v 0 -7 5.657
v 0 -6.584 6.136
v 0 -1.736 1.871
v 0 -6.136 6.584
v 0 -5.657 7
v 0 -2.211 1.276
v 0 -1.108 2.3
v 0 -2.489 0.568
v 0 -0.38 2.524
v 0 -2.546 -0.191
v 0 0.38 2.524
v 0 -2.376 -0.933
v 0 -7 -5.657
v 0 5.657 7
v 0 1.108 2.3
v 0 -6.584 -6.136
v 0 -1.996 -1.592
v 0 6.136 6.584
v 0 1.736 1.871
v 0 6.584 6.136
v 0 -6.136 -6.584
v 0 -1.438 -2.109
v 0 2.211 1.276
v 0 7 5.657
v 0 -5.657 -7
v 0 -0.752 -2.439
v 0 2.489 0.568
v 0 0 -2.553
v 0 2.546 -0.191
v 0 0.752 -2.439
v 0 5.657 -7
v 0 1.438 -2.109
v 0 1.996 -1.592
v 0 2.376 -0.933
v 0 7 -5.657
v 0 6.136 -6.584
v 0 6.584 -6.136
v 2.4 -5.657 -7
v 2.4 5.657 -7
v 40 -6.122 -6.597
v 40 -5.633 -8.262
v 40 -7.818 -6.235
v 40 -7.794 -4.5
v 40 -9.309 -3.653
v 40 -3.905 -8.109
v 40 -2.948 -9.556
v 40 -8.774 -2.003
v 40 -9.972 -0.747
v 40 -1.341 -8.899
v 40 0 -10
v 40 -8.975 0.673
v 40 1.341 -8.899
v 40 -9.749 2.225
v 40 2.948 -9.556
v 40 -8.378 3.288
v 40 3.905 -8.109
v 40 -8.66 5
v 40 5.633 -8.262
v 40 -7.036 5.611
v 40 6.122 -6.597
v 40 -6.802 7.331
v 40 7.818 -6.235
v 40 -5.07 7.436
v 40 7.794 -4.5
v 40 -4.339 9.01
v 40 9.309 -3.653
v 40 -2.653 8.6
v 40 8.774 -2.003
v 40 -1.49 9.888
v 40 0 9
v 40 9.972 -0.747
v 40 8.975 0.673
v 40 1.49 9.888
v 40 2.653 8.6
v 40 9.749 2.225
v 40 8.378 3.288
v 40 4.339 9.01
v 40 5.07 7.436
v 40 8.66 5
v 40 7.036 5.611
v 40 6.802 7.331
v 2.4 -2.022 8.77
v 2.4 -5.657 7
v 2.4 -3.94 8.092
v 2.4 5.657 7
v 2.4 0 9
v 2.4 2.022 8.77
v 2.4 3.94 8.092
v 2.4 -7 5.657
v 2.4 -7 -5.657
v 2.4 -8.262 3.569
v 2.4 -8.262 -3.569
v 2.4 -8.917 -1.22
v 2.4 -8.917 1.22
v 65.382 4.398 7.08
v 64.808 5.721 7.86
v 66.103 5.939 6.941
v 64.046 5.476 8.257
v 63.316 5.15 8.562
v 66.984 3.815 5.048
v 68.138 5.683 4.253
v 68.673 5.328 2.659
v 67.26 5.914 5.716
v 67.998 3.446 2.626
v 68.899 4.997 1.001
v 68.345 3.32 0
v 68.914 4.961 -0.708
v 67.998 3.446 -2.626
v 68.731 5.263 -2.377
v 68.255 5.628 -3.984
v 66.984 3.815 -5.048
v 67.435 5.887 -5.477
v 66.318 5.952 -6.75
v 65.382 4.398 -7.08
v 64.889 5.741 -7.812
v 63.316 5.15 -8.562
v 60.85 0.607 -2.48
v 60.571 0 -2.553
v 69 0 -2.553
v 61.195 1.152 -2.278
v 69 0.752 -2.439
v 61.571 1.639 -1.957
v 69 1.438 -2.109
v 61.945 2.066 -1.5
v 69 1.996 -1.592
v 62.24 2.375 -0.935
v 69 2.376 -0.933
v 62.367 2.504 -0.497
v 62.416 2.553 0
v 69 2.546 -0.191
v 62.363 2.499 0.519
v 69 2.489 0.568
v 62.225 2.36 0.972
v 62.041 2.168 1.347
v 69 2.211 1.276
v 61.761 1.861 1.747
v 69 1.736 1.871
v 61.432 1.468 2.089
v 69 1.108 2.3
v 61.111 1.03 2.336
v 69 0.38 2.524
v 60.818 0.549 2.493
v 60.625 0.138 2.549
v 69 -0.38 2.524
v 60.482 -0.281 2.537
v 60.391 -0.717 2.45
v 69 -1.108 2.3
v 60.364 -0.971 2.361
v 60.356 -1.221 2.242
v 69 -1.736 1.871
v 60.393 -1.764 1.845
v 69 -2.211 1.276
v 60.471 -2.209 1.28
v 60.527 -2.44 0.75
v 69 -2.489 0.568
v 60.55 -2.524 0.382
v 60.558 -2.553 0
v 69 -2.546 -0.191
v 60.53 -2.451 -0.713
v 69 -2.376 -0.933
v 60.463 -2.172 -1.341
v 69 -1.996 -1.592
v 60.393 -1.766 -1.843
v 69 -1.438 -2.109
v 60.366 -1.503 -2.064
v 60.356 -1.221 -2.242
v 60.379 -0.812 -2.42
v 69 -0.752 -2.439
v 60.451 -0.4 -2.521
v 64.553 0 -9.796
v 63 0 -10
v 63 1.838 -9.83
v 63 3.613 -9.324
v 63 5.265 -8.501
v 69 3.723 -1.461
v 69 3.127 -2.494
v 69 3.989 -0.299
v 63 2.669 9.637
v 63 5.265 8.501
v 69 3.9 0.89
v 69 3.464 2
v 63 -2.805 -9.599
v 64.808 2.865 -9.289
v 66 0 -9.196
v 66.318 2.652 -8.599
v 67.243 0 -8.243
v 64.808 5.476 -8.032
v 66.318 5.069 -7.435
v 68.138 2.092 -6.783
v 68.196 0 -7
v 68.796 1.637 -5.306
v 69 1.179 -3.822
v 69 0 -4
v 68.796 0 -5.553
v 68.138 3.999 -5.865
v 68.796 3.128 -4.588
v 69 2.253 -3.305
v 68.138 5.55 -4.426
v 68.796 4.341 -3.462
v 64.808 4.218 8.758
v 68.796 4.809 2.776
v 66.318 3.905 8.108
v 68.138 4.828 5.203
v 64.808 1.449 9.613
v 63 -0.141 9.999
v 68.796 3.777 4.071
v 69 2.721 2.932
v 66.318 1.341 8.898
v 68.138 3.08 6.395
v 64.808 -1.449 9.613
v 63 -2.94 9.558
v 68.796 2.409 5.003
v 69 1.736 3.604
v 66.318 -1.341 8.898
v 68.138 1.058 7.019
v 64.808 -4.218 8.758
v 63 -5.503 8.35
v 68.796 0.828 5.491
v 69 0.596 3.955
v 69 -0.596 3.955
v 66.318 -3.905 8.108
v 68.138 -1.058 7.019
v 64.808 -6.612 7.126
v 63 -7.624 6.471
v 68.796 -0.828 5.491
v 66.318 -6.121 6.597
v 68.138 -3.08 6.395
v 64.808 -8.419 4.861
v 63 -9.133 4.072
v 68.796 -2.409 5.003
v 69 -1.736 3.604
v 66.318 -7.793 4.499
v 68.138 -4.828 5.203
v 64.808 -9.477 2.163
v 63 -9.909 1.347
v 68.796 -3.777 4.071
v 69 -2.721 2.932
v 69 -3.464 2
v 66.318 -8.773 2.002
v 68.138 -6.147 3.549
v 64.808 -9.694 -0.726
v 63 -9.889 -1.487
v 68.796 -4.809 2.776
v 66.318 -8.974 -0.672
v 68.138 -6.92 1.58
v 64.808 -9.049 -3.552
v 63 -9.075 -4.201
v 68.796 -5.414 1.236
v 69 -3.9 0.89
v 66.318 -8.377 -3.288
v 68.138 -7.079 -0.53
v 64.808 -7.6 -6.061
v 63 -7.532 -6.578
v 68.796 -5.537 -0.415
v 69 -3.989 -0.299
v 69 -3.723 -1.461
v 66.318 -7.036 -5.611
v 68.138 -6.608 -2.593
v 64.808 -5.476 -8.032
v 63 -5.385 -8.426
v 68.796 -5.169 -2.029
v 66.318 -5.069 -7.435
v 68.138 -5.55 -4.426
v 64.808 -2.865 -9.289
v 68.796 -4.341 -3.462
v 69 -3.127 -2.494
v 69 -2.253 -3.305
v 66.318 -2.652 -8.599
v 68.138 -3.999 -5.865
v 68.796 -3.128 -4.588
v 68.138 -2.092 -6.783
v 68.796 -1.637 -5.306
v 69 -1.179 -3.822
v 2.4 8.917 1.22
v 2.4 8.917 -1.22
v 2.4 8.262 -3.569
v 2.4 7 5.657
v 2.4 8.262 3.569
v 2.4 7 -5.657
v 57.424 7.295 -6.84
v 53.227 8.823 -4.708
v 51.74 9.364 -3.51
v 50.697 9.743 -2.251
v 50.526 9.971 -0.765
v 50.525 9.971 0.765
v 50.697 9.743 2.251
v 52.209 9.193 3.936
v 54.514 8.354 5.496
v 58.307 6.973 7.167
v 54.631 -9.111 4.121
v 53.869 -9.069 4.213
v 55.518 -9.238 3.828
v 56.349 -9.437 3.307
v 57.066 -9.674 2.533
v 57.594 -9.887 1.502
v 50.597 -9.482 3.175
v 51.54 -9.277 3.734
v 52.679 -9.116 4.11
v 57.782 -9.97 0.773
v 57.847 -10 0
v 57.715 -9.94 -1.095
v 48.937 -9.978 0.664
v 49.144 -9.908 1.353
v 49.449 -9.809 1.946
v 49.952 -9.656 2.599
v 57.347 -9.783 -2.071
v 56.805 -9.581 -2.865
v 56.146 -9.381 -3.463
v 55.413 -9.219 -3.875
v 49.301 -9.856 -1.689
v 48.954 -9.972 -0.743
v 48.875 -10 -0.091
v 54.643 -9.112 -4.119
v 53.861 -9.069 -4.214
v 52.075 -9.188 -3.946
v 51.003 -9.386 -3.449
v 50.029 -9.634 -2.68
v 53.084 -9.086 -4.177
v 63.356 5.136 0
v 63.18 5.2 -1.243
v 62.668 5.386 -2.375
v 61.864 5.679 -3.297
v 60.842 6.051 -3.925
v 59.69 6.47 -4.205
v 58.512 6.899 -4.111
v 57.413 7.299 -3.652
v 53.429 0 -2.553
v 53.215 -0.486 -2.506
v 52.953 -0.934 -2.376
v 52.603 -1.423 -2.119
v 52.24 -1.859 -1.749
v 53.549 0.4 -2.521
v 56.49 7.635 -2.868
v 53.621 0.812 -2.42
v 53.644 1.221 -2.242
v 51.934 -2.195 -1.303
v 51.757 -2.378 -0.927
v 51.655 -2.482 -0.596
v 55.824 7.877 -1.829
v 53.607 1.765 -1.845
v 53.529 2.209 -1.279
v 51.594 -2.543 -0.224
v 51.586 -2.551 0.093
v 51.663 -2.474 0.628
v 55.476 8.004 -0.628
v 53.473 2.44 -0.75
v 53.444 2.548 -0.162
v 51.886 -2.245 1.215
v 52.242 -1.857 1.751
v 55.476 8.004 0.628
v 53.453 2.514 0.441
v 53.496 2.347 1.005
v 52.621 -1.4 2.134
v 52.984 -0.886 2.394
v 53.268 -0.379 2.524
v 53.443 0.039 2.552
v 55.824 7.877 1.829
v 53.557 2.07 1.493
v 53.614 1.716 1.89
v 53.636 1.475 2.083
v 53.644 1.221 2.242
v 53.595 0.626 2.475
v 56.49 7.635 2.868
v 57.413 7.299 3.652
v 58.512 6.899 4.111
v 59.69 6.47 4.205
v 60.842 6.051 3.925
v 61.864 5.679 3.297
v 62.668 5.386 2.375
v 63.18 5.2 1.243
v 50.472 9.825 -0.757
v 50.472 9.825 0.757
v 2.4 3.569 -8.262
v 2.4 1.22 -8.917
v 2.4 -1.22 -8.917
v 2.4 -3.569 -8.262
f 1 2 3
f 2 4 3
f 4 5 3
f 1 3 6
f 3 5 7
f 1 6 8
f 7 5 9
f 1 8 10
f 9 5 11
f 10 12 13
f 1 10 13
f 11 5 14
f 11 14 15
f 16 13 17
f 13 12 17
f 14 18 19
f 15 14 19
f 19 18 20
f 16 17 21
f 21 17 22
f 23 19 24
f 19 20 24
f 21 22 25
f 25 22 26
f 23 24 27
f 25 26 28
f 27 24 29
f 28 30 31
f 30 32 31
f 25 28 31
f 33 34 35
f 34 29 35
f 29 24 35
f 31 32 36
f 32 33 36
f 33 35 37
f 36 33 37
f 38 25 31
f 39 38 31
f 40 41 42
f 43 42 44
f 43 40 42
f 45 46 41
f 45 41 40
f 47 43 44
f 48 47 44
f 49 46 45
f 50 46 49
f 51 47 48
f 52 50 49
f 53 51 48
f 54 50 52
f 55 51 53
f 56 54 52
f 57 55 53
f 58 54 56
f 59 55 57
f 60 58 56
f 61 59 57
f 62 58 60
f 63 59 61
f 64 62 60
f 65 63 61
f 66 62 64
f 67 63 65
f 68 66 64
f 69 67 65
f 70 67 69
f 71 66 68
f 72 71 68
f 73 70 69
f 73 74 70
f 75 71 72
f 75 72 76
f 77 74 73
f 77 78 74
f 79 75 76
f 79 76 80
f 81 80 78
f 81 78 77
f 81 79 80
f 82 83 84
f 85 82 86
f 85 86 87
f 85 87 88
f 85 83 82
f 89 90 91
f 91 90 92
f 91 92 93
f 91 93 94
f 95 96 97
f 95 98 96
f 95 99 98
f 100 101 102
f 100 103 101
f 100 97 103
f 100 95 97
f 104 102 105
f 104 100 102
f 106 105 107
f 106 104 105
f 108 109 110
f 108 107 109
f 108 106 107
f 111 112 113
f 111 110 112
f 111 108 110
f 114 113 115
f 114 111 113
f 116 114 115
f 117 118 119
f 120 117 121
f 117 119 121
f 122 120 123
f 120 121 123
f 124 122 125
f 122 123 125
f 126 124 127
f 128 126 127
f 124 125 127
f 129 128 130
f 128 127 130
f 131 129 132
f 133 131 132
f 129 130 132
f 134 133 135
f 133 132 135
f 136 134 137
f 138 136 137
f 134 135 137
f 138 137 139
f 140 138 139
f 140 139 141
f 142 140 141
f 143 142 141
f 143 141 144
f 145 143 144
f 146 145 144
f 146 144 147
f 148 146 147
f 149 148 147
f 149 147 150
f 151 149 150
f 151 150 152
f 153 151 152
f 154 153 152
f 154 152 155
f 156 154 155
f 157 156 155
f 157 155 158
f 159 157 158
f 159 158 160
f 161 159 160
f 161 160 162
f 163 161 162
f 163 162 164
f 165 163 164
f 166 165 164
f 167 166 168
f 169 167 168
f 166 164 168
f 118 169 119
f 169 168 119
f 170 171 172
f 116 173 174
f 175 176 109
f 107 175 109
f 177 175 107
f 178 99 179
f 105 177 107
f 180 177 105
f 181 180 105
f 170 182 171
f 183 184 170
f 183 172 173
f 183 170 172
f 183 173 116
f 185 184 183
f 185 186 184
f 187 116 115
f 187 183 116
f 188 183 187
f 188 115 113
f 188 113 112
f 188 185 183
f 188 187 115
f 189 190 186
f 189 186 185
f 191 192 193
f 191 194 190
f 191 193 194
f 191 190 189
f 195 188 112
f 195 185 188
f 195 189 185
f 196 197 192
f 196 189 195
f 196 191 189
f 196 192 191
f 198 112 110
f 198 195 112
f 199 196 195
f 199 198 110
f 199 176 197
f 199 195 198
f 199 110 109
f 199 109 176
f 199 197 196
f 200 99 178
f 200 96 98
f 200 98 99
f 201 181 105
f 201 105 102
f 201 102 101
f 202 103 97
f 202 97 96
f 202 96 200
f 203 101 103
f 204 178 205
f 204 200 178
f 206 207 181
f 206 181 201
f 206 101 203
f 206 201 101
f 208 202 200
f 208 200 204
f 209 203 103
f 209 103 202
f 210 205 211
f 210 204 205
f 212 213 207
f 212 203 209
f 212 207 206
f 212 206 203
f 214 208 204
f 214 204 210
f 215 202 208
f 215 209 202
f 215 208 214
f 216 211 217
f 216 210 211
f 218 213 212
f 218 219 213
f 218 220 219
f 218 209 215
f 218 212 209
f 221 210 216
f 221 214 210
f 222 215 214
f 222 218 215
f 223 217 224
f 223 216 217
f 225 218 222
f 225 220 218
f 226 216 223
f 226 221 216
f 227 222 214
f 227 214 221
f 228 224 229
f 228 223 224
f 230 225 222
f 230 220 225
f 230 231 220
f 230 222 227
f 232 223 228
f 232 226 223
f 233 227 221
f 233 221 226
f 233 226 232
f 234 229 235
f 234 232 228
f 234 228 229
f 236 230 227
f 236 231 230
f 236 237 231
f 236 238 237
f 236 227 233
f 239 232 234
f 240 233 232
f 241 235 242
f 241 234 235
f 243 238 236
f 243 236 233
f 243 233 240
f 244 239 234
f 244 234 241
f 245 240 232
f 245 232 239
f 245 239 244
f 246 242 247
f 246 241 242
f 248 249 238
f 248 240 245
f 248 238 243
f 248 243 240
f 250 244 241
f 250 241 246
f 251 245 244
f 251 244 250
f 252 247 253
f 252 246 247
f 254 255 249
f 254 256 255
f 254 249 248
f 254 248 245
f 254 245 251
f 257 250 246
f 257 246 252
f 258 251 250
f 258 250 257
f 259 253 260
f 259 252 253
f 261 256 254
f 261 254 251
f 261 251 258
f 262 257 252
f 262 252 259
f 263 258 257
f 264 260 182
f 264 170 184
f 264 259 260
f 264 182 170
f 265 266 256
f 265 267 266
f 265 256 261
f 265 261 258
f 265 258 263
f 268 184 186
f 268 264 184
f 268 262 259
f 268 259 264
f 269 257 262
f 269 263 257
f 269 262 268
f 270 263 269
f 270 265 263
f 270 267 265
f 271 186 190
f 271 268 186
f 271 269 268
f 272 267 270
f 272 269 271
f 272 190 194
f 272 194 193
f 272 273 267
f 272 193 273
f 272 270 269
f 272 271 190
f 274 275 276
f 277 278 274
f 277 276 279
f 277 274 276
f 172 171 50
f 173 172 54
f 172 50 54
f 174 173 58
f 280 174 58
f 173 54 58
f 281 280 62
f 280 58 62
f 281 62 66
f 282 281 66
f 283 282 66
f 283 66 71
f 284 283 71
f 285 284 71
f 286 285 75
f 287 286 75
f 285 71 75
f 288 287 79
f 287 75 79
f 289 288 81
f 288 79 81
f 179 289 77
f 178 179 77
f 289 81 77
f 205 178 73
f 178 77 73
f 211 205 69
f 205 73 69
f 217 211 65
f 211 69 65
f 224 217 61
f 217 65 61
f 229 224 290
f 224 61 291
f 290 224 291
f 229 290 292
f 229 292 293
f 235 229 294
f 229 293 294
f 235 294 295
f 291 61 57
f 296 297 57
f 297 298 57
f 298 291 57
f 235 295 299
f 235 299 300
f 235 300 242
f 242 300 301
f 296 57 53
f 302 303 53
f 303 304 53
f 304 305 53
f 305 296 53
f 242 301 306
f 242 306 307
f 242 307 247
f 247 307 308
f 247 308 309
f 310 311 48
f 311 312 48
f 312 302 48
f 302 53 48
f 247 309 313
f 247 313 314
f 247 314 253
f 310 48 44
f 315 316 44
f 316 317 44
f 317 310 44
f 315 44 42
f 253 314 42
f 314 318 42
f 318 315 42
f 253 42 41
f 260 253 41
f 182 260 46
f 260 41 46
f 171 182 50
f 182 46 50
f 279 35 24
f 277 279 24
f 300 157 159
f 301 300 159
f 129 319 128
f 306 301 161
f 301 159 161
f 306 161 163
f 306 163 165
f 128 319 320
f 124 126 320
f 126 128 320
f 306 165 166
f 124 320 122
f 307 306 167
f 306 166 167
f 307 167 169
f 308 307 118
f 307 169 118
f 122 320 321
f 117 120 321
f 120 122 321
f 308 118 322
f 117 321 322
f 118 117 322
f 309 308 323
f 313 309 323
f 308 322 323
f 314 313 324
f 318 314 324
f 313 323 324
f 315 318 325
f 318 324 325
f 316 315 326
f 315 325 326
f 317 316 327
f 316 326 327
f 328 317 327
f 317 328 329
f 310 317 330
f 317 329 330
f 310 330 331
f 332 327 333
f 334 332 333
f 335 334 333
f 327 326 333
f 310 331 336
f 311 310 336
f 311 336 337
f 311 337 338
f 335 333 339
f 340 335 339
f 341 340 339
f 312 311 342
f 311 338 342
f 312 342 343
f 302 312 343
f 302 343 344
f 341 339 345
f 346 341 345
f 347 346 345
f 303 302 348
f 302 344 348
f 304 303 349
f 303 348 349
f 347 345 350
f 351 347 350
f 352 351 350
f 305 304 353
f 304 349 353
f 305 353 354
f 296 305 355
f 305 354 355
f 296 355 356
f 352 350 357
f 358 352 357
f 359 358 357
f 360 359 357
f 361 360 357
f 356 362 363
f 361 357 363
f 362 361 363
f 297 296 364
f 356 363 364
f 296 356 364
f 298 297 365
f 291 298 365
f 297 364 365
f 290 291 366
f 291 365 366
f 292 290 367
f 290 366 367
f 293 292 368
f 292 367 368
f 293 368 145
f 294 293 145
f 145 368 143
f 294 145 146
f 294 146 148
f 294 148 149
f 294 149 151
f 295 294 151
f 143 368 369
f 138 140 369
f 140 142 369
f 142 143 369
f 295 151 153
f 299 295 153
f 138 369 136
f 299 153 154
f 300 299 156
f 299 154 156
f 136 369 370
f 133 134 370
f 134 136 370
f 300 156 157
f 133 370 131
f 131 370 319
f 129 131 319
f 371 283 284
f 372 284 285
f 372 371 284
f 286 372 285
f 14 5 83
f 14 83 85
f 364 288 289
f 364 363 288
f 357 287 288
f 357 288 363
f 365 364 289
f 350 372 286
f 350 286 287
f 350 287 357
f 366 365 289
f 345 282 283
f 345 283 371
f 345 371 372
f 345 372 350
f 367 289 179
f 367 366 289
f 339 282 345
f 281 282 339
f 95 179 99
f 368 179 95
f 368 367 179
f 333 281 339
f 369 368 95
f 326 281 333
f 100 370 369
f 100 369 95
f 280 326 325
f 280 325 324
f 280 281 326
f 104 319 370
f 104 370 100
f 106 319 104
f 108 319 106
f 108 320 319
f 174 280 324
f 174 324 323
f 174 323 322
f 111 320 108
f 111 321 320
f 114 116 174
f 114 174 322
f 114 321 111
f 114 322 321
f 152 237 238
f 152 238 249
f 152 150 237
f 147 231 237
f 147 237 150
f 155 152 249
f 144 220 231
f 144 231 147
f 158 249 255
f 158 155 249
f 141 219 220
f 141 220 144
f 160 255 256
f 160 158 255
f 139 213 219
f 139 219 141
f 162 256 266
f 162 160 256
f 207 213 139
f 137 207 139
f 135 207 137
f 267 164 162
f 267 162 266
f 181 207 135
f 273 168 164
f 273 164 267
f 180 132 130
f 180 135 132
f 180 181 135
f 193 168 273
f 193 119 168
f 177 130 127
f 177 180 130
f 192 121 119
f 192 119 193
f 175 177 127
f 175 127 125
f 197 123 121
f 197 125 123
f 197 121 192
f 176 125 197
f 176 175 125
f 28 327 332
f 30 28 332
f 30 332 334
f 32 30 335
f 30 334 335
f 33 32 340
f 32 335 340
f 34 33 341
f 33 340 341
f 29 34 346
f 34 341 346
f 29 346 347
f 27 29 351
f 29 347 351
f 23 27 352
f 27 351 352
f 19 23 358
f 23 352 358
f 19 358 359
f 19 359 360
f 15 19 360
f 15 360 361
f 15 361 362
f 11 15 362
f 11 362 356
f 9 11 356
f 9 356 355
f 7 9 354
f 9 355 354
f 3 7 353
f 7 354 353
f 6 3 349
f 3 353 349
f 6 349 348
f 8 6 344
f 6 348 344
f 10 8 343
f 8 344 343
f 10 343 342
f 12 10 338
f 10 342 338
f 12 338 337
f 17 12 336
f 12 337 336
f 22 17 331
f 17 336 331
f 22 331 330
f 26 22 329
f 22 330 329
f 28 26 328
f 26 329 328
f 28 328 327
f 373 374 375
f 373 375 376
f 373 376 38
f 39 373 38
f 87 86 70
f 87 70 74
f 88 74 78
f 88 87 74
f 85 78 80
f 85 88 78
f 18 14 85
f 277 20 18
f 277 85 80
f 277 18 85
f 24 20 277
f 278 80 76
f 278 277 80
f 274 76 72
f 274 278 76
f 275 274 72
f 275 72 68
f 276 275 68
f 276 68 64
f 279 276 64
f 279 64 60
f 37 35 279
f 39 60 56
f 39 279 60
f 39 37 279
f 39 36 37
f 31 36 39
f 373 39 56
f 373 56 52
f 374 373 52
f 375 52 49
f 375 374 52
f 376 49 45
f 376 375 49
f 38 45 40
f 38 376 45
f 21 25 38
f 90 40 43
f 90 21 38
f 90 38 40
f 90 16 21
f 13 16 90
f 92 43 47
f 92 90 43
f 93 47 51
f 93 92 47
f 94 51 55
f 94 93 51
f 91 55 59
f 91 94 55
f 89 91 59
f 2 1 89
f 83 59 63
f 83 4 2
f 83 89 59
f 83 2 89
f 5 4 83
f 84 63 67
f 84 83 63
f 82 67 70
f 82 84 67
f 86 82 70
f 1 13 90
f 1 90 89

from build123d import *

# Parameters (mm, degrees)
SKETCH1_R               = 10
BOSS_EXTRUDE1_DEPTH     = 69
SKETCH9_OUTSIDE_W       = 36.914
SKETCH9_OUTSIDE_H       = 36.914
SKETCH9_OUTSIDE_R       = 9
CUT_EXTRUDE5_DEPTH      = 40
SKETCH2_OUTSIDE_W       = 36.914
SKETCH2_OUTSIDE_H       = 36.914
SKETCH2_OUTSIDE_W_2     = 14
SKETCH2_OUTSIDE_H_2     = 14
CUT_EXTRUDE1_DEPTH      = 2.4
F_1_4_20_TAPPED_HOLE1_D = 5.1054
FILLET2_R               = 6
CUT_EXTRUDE2_DEPTH      = 59.72818744
CUT_EXTRUDE2_DEPTH_BACK = 59.72818744
SKETCH7_R               = 4.2164
CUT_EXTRUDE3_START      = 7
SKETCH8_R               = 9.525
CUT_EXTRUDE3_DEPTH      = 52.728187572


with BuildPart() as part:
    # Sketch1 → Boss-Extrude1 (new body)
    with BuildSketch(Plane(origin=(0, 0, 0), x_dir=(0, 0, -1), z_dir=(1, 0, 0))):
        Circle(SKETCH1_R)
    extrude(amount=BOSS_EXTRUDE1_DEPTH)

    # Sketch9 outside → Cut-Extrude5 (cut)
    with BuildSketch(Plane.ZY):
        Rectangle(SKETCH9_OUTSIDE_W, SKETCH9_OUTSIDE_H)
        Circle(SKETCH9_OUTSIDE_R, mode=Mode.SUBTRACT)
    extrude(amount=-CUT_EXTRUDE5_DEPTH, mode=Mode.SUBTRACT)

    # Sketch2 outside → Cut-Extrude1 (cut)
    with BuildSketch(Plane.ZY):
        Rectangle(SKETCH2_OUTSIDE_W, SKETCH2_OUTSIDE_H)
        Rectangle(SKETCH2_OUTSIDE_W_2, SKETCH2_OUTSIDE_H_2, mode=Mode.SUBTRACT)
    extrude(amount=-CUT_EXTRUDE1_DEPTH, mode=Mode.SUBTRACT)

    # 1_4-20 Tapped Hole1 (through all)
    with Locations(Plane.ZY):
        with Locations((0, 0)):
            Hole(F_1_4_20_TAPPED_HOLE1_D / 2)

    # Fillet2
    fillet2_edges = [part.edges().sort_by_distance(p)[0] for p in [
        (69, 0, 10),
    ]]
    fillet(fillet2_edges, radius=FILLET2_R)

    # Sketch7 → Cut-Extrude2 (cut, two sides: drawn at the far end of the back side and taken through both)
    with BuildSketch(Plane(origin=(57, 0, 0), x_dir=(0.9396926207859094, -0.3420201433256659, 0), z_dir=(0.3420201433256659, 0.9396926207859094, 0)).offset(-CUT_EXTRUDE2_DEPTH_BACK)):
        Circle(SKETCH7_R)
    extrude(amount=CUT_EXTRUDE2_DEPTH + CUT_EXTRUDE2_DEPTH_BACK, mode=Mode.SUBTRACT)

    # Sketch8 → Cut-Extrude3 (cut, through all)
    with BuildSketch(Plane(origin=(57, 0, 0), x_dir=(0.9396926207859094, -0.3420201433256659, 0), z_dir=(0.3420201433256659, 0.9396926207859094, 0)).offset(CUT_EXTRUDE3_START)):
        Circle(SKETCH8_R)
    extrude(amount=CUT_EXTRUDE3_DEPTH, mode=Mode.SUBTRACT)


solid = part.part
